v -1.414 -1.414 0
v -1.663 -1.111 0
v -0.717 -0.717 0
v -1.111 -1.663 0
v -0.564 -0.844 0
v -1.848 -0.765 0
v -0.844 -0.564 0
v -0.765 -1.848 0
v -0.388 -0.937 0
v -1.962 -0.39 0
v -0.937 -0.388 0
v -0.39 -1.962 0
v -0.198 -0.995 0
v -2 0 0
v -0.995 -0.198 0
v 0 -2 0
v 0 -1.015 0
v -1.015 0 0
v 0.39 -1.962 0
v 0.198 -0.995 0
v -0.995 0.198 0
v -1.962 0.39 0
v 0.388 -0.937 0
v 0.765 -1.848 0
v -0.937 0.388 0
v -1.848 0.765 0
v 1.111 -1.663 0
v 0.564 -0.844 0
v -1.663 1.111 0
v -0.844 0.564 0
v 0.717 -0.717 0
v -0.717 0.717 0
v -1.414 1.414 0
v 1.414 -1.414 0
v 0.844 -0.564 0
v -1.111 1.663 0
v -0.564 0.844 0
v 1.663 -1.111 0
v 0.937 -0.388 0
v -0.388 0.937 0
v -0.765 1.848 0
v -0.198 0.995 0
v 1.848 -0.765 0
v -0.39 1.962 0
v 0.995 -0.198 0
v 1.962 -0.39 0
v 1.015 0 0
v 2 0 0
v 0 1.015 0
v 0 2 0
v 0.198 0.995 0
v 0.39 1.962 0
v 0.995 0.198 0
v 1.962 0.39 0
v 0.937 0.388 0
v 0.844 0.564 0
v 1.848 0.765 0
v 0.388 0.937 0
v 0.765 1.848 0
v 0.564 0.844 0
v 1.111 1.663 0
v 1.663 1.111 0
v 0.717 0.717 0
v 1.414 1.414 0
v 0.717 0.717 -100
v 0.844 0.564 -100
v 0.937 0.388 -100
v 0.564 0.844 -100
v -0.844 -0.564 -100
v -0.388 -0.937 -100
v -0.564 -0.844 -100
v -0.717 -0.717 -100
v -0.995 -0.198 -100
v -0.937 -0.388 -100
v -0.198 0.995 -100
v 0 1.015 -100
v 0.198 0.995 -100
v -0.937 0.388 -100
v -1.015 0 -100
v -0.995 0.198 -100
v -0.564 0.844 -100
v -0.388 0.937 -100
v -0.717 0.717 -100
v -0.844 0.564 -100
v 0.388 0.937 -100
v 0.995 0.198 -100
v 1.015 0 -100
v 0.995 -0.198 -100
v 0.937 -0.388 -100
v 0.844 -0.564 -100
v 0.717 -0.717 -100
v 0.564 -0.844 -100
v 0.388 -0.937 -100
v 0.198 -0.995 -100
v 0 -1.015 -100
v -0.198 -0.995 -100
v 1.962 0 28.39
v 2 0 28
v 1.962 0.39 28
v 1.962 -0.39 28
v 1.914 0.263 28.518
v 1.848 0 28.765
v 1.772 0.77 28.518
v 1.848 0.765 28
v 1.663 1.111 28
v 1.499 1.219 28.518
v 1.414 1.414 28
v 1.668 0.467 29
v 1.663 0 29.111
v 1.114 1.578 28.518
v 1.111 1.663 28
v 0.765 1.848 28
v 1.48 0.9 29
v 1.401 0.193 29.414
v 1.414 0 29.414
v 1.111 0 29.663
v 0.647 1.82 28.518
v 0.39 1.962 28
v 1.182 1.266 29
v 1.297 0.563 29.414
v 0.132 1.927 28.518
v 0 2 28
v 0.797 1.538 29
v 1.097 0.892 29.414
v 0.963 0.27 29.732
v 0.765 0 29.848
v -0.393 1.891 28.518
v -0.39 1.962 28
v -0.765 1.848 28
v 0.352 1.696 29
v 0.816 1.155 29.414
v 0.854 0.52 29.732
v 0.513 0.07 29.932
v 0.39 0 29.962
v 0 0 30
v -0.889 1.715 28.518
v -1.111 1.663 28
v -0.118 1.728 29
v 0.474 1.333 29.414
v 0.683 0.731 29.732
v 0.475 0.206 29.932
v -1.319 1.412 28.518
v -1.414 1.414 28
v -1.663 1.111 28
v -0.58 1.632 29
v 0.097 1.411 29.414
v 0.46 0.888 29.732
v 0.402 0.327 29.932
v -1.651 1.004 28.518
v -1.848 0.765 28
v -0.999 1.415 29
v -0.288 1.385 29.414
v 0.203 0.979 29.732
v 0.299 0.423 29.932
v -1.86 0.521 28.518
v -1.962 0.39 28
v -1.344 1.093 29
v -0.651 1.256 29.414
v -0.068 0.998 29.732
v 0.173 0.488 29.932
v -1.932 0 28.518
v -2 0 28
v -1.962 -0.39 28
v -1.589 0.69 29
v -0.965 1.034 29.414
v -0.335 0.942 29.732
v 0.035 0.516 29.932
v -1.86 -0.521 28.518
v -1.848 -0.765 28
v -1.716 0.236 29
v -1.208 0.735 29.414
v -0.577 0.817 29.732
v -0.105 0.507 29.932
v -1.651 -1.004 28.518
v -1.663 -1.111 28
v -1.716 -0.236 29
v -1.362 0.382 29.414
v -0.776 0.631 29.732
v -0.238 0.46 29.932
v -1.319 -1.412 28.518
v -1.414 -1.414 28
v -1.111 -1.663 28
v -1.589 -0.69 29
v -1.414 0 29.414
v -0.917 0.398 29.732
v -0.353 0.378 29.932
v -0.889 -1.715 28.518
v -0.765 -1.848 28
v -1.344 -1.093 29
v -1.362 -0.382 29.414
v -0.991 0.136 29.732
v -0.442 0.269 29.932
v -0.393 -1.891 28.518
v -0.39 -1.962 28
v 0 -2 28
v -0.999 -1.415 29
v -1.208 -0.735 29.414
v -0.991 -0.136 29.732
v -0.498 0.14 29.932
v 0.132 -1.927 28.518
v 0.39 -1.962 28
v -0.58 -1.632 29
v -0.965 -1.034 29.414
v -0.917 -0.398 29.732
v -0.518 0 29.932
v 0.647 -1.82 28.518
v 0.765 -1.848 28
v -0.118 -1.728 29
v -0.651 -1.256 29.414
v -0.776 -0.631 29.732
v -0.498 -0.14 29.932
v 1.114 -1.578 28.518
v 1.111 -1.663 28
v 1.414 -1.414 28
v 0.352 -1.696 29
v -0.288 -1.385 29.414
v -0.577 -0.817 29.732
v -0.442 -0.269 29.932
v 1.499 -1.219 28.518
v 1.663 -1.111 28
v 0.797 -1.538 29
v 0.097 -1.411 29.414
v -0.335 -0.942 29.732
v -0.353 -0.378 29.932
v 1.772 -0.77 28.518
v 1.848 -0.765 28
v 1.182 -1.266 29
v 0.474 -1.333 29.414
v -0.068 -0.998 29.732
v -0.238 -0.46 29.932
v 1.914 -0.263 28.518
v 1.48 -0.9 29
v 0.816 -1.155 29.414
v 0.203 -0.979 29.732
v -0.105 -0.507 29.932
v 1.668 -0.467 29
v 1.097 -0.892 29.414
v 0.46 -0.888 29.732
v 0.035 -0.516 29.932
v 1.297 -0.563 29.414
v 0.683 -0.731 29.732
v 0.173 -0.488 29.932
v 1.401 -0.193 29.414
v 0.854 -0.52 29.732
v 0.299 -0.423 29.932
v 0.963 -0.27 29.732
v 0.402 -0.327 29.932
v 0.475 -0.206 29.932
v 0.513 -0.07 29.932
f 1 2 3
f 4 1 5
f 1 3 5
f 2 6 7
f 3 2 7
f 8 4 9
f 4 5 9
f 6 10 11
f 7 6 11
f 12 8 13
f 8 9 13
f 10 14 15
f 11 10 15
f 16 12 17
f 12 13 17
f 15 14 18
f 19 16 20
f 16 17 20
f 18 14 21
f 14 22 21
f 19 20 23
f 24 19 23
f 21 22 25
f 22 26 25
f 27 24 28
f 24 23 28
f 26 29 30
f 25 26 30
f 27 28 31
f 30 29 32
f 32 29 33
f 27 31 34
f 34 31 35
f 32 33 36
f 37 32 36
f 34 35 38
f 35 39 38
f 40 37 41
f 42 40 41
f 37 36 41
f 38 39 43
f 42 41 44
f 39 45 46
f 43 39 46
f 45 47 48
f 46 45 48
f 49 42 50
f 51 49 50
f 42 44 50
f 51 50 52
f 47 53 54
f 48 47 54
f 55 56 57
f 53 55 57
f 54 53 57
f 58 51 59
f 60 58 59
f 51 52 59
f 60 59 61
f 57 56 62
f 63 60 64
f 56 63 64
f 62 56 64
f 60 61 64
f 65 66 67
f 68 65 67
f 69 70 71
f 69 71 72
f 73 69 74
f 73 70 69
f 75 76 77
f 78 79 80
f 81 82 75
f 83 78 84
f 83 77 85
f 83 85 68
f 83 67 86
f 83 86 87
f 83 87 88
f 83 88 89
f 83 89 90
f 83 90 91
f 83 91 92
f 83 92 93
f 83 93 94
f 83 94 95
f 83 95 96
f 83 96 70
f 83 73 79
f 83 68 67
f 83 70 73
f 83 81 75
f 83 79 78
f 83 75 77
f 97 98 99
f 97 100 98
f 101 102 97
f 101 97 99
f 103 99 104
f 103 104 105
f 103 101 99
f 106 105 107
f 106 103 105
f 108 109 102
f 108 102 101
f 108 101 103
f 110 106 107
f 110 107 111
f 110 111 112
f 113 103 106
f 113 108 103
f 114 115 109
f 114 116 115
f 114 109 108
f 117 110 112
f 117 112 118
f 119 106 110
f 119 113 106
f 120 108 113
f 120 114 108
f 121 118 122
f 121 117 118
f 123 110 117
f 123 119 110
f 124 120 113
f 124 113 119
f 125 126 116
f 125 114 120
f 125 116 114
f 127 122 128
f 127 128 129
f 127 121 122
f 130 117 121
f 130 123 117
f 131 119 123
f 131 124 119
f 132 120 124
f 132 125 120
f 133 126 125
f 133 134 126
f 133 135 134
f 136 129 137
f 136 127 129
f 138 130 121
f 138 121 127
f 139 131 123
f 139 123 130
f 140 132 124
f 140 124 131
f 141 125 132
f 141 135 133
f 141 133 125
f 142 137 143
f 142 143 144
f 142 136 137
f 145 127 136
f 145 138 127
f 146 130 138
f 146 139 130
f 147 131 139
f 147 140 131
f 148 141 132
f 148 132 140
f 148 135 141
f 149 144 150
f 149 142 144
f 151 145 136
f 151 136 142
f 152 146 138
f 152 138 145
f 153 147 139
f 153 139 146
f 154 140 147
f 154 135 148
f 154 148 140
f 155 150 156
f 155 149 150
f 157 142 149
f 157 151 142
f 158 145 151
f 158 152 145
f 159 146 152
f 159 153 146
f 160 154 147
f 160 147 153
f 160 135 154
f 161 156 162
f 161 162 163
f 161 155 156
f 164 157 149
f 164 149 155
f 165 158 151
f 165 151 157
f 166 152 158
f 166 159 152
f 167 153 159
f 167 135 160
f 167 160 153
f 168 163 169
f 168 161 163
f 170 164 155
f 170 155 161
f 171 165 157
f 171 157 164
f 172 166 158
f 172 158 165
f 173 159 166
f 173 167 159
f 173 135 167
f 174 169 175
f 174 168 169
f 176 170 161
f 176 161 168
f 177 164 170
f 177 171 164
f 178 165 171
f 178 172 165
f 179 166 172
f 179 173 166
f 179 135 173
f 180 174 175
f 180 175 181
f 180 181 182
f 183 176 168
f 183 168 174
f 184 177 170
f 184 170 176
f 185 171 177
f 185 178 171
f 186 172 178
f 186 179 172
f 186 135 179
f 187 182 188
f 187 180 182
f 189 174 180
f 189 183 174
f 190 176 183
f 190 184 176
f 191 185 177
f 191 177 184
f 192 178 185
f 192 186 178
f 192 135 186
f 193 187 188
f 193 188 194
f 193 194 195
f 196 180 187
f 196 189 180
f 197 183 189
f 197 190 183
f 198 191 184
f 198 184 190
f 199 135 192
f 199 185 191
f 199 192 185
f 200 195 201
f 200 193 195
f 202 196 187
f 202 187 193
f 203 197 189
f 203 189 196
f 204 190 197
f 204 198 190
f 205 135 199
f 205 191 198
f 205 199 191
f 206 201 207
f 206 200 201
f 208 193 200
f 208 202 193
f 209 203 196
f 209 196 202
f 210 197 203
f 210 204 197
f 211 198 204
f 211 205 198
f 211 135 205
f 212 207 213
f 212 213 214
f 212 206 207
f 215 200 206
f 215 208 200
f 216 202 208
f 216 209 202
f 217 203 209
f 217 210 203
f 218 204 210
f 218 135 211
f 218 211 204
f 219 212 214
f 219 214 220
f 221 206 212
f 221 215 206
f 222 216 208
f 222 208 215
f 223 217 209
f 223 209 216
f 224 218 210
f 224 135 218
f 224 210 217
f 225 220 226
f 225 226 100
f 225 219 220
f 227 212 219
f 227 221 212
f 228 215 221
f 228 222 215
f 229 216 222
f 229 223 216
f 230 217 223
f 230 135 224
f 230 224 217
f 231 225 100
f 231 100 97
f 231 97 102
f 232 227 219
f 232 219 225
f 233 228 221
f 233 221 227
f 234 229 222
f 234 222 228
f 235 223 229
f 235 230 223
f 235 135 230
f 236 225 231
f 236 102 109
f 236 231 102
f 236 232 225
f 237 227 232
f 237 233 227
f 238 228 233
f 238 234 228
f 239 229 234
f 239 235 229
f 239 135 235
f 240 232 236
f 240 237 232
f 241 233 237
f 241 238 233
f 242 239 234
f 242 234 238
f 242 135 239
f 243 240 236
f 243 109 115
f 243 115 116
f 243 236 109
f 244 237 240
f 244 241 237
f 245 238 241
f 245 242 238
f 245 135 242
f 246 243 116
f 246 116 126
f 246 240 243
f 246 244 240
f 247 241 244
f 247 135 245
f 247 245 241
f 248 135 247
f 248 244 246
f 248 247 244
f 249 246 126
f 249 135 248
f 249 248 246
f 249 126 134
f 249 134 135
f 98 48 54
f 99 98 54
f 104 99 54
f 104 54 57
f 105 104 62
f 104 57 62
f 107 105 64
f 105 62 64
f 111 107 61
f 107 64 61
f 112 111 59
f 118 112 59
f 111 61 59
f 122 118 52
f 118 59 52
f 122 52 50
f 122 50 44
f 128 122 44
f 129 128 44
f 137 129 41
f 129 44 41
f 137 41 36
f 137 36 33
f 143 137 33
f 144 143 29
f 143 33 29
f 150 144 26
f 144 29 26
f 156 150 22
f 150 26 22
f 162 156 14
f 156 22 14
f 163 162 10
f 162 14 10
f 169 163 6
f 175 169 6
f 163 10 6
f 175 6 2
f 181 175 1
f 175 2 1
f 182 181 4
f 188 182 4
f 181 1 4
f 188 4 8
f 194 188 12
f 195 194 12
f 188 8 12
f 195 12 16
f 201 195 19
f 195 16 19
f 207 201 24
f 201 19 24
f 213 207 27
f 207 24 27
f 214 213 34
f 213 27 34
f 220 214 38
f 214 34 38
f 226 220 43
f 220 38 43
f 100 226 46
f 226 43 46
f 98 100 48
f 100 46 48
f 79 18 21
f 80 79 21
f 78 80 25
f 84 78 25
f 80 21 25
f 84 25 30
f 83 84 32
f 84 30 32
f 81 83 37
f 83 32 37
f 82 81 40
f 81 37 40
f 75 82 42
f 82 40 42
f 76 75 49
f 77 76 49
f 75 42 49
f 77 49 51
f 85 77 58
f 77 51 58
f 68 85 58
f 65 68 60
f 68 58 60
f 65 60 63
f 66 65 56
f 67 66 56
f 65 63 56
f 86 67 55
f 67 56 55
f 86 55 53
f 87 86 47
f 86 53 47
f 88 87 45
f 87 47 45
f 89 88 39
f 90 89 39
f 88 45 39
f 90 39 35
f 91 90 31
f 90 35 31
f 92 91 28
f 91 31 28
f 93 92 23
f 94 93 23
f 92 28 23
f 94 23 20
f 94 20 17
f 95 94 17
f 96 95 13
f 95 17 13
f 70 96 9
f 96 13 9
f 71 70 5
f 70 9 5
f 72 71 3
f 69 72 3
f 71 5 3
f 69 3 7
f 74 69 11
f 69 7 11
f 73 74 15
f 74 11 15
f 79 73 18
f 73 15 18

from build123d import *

# Parameters (mm, degrees)
SKETCH1_R           = 2
BOSS_EXTRUDE1_DEPTH = 30
FILLET1_R           = 2
SKETCH2_R           = 1.014585346
BOSS_EXTRUDE2_DEPTH = 100


with BuildPart() as part:
    # Sketch1 → Boss-Extrude1 (new body)
    with BuildSketch(Plane.XY):
        Circle(SKETCH1_R)
    extrude(amount=BOSS_EXTRUDE1_DEPTH)

    # Fillet1
    fillet1_edges = [part.edges().sort_by_distance(p)[0] for p in [
        (-2, 0, 30),
    ]]
    fillet(fillet1_edges, radius=FILLET1_R)

    # Sketch2 → Boss-Extrude2 (add)
    with BuildSketch(Plane(origin=(0, 0, 0), x_dir=(-1, 0, 0), z_dir=(0, 0, -1))):
        Circle(SKETCH2_R)
    extrude(amount=BOSS_EXTRUDE2_DEPTH)


solid = part.part
